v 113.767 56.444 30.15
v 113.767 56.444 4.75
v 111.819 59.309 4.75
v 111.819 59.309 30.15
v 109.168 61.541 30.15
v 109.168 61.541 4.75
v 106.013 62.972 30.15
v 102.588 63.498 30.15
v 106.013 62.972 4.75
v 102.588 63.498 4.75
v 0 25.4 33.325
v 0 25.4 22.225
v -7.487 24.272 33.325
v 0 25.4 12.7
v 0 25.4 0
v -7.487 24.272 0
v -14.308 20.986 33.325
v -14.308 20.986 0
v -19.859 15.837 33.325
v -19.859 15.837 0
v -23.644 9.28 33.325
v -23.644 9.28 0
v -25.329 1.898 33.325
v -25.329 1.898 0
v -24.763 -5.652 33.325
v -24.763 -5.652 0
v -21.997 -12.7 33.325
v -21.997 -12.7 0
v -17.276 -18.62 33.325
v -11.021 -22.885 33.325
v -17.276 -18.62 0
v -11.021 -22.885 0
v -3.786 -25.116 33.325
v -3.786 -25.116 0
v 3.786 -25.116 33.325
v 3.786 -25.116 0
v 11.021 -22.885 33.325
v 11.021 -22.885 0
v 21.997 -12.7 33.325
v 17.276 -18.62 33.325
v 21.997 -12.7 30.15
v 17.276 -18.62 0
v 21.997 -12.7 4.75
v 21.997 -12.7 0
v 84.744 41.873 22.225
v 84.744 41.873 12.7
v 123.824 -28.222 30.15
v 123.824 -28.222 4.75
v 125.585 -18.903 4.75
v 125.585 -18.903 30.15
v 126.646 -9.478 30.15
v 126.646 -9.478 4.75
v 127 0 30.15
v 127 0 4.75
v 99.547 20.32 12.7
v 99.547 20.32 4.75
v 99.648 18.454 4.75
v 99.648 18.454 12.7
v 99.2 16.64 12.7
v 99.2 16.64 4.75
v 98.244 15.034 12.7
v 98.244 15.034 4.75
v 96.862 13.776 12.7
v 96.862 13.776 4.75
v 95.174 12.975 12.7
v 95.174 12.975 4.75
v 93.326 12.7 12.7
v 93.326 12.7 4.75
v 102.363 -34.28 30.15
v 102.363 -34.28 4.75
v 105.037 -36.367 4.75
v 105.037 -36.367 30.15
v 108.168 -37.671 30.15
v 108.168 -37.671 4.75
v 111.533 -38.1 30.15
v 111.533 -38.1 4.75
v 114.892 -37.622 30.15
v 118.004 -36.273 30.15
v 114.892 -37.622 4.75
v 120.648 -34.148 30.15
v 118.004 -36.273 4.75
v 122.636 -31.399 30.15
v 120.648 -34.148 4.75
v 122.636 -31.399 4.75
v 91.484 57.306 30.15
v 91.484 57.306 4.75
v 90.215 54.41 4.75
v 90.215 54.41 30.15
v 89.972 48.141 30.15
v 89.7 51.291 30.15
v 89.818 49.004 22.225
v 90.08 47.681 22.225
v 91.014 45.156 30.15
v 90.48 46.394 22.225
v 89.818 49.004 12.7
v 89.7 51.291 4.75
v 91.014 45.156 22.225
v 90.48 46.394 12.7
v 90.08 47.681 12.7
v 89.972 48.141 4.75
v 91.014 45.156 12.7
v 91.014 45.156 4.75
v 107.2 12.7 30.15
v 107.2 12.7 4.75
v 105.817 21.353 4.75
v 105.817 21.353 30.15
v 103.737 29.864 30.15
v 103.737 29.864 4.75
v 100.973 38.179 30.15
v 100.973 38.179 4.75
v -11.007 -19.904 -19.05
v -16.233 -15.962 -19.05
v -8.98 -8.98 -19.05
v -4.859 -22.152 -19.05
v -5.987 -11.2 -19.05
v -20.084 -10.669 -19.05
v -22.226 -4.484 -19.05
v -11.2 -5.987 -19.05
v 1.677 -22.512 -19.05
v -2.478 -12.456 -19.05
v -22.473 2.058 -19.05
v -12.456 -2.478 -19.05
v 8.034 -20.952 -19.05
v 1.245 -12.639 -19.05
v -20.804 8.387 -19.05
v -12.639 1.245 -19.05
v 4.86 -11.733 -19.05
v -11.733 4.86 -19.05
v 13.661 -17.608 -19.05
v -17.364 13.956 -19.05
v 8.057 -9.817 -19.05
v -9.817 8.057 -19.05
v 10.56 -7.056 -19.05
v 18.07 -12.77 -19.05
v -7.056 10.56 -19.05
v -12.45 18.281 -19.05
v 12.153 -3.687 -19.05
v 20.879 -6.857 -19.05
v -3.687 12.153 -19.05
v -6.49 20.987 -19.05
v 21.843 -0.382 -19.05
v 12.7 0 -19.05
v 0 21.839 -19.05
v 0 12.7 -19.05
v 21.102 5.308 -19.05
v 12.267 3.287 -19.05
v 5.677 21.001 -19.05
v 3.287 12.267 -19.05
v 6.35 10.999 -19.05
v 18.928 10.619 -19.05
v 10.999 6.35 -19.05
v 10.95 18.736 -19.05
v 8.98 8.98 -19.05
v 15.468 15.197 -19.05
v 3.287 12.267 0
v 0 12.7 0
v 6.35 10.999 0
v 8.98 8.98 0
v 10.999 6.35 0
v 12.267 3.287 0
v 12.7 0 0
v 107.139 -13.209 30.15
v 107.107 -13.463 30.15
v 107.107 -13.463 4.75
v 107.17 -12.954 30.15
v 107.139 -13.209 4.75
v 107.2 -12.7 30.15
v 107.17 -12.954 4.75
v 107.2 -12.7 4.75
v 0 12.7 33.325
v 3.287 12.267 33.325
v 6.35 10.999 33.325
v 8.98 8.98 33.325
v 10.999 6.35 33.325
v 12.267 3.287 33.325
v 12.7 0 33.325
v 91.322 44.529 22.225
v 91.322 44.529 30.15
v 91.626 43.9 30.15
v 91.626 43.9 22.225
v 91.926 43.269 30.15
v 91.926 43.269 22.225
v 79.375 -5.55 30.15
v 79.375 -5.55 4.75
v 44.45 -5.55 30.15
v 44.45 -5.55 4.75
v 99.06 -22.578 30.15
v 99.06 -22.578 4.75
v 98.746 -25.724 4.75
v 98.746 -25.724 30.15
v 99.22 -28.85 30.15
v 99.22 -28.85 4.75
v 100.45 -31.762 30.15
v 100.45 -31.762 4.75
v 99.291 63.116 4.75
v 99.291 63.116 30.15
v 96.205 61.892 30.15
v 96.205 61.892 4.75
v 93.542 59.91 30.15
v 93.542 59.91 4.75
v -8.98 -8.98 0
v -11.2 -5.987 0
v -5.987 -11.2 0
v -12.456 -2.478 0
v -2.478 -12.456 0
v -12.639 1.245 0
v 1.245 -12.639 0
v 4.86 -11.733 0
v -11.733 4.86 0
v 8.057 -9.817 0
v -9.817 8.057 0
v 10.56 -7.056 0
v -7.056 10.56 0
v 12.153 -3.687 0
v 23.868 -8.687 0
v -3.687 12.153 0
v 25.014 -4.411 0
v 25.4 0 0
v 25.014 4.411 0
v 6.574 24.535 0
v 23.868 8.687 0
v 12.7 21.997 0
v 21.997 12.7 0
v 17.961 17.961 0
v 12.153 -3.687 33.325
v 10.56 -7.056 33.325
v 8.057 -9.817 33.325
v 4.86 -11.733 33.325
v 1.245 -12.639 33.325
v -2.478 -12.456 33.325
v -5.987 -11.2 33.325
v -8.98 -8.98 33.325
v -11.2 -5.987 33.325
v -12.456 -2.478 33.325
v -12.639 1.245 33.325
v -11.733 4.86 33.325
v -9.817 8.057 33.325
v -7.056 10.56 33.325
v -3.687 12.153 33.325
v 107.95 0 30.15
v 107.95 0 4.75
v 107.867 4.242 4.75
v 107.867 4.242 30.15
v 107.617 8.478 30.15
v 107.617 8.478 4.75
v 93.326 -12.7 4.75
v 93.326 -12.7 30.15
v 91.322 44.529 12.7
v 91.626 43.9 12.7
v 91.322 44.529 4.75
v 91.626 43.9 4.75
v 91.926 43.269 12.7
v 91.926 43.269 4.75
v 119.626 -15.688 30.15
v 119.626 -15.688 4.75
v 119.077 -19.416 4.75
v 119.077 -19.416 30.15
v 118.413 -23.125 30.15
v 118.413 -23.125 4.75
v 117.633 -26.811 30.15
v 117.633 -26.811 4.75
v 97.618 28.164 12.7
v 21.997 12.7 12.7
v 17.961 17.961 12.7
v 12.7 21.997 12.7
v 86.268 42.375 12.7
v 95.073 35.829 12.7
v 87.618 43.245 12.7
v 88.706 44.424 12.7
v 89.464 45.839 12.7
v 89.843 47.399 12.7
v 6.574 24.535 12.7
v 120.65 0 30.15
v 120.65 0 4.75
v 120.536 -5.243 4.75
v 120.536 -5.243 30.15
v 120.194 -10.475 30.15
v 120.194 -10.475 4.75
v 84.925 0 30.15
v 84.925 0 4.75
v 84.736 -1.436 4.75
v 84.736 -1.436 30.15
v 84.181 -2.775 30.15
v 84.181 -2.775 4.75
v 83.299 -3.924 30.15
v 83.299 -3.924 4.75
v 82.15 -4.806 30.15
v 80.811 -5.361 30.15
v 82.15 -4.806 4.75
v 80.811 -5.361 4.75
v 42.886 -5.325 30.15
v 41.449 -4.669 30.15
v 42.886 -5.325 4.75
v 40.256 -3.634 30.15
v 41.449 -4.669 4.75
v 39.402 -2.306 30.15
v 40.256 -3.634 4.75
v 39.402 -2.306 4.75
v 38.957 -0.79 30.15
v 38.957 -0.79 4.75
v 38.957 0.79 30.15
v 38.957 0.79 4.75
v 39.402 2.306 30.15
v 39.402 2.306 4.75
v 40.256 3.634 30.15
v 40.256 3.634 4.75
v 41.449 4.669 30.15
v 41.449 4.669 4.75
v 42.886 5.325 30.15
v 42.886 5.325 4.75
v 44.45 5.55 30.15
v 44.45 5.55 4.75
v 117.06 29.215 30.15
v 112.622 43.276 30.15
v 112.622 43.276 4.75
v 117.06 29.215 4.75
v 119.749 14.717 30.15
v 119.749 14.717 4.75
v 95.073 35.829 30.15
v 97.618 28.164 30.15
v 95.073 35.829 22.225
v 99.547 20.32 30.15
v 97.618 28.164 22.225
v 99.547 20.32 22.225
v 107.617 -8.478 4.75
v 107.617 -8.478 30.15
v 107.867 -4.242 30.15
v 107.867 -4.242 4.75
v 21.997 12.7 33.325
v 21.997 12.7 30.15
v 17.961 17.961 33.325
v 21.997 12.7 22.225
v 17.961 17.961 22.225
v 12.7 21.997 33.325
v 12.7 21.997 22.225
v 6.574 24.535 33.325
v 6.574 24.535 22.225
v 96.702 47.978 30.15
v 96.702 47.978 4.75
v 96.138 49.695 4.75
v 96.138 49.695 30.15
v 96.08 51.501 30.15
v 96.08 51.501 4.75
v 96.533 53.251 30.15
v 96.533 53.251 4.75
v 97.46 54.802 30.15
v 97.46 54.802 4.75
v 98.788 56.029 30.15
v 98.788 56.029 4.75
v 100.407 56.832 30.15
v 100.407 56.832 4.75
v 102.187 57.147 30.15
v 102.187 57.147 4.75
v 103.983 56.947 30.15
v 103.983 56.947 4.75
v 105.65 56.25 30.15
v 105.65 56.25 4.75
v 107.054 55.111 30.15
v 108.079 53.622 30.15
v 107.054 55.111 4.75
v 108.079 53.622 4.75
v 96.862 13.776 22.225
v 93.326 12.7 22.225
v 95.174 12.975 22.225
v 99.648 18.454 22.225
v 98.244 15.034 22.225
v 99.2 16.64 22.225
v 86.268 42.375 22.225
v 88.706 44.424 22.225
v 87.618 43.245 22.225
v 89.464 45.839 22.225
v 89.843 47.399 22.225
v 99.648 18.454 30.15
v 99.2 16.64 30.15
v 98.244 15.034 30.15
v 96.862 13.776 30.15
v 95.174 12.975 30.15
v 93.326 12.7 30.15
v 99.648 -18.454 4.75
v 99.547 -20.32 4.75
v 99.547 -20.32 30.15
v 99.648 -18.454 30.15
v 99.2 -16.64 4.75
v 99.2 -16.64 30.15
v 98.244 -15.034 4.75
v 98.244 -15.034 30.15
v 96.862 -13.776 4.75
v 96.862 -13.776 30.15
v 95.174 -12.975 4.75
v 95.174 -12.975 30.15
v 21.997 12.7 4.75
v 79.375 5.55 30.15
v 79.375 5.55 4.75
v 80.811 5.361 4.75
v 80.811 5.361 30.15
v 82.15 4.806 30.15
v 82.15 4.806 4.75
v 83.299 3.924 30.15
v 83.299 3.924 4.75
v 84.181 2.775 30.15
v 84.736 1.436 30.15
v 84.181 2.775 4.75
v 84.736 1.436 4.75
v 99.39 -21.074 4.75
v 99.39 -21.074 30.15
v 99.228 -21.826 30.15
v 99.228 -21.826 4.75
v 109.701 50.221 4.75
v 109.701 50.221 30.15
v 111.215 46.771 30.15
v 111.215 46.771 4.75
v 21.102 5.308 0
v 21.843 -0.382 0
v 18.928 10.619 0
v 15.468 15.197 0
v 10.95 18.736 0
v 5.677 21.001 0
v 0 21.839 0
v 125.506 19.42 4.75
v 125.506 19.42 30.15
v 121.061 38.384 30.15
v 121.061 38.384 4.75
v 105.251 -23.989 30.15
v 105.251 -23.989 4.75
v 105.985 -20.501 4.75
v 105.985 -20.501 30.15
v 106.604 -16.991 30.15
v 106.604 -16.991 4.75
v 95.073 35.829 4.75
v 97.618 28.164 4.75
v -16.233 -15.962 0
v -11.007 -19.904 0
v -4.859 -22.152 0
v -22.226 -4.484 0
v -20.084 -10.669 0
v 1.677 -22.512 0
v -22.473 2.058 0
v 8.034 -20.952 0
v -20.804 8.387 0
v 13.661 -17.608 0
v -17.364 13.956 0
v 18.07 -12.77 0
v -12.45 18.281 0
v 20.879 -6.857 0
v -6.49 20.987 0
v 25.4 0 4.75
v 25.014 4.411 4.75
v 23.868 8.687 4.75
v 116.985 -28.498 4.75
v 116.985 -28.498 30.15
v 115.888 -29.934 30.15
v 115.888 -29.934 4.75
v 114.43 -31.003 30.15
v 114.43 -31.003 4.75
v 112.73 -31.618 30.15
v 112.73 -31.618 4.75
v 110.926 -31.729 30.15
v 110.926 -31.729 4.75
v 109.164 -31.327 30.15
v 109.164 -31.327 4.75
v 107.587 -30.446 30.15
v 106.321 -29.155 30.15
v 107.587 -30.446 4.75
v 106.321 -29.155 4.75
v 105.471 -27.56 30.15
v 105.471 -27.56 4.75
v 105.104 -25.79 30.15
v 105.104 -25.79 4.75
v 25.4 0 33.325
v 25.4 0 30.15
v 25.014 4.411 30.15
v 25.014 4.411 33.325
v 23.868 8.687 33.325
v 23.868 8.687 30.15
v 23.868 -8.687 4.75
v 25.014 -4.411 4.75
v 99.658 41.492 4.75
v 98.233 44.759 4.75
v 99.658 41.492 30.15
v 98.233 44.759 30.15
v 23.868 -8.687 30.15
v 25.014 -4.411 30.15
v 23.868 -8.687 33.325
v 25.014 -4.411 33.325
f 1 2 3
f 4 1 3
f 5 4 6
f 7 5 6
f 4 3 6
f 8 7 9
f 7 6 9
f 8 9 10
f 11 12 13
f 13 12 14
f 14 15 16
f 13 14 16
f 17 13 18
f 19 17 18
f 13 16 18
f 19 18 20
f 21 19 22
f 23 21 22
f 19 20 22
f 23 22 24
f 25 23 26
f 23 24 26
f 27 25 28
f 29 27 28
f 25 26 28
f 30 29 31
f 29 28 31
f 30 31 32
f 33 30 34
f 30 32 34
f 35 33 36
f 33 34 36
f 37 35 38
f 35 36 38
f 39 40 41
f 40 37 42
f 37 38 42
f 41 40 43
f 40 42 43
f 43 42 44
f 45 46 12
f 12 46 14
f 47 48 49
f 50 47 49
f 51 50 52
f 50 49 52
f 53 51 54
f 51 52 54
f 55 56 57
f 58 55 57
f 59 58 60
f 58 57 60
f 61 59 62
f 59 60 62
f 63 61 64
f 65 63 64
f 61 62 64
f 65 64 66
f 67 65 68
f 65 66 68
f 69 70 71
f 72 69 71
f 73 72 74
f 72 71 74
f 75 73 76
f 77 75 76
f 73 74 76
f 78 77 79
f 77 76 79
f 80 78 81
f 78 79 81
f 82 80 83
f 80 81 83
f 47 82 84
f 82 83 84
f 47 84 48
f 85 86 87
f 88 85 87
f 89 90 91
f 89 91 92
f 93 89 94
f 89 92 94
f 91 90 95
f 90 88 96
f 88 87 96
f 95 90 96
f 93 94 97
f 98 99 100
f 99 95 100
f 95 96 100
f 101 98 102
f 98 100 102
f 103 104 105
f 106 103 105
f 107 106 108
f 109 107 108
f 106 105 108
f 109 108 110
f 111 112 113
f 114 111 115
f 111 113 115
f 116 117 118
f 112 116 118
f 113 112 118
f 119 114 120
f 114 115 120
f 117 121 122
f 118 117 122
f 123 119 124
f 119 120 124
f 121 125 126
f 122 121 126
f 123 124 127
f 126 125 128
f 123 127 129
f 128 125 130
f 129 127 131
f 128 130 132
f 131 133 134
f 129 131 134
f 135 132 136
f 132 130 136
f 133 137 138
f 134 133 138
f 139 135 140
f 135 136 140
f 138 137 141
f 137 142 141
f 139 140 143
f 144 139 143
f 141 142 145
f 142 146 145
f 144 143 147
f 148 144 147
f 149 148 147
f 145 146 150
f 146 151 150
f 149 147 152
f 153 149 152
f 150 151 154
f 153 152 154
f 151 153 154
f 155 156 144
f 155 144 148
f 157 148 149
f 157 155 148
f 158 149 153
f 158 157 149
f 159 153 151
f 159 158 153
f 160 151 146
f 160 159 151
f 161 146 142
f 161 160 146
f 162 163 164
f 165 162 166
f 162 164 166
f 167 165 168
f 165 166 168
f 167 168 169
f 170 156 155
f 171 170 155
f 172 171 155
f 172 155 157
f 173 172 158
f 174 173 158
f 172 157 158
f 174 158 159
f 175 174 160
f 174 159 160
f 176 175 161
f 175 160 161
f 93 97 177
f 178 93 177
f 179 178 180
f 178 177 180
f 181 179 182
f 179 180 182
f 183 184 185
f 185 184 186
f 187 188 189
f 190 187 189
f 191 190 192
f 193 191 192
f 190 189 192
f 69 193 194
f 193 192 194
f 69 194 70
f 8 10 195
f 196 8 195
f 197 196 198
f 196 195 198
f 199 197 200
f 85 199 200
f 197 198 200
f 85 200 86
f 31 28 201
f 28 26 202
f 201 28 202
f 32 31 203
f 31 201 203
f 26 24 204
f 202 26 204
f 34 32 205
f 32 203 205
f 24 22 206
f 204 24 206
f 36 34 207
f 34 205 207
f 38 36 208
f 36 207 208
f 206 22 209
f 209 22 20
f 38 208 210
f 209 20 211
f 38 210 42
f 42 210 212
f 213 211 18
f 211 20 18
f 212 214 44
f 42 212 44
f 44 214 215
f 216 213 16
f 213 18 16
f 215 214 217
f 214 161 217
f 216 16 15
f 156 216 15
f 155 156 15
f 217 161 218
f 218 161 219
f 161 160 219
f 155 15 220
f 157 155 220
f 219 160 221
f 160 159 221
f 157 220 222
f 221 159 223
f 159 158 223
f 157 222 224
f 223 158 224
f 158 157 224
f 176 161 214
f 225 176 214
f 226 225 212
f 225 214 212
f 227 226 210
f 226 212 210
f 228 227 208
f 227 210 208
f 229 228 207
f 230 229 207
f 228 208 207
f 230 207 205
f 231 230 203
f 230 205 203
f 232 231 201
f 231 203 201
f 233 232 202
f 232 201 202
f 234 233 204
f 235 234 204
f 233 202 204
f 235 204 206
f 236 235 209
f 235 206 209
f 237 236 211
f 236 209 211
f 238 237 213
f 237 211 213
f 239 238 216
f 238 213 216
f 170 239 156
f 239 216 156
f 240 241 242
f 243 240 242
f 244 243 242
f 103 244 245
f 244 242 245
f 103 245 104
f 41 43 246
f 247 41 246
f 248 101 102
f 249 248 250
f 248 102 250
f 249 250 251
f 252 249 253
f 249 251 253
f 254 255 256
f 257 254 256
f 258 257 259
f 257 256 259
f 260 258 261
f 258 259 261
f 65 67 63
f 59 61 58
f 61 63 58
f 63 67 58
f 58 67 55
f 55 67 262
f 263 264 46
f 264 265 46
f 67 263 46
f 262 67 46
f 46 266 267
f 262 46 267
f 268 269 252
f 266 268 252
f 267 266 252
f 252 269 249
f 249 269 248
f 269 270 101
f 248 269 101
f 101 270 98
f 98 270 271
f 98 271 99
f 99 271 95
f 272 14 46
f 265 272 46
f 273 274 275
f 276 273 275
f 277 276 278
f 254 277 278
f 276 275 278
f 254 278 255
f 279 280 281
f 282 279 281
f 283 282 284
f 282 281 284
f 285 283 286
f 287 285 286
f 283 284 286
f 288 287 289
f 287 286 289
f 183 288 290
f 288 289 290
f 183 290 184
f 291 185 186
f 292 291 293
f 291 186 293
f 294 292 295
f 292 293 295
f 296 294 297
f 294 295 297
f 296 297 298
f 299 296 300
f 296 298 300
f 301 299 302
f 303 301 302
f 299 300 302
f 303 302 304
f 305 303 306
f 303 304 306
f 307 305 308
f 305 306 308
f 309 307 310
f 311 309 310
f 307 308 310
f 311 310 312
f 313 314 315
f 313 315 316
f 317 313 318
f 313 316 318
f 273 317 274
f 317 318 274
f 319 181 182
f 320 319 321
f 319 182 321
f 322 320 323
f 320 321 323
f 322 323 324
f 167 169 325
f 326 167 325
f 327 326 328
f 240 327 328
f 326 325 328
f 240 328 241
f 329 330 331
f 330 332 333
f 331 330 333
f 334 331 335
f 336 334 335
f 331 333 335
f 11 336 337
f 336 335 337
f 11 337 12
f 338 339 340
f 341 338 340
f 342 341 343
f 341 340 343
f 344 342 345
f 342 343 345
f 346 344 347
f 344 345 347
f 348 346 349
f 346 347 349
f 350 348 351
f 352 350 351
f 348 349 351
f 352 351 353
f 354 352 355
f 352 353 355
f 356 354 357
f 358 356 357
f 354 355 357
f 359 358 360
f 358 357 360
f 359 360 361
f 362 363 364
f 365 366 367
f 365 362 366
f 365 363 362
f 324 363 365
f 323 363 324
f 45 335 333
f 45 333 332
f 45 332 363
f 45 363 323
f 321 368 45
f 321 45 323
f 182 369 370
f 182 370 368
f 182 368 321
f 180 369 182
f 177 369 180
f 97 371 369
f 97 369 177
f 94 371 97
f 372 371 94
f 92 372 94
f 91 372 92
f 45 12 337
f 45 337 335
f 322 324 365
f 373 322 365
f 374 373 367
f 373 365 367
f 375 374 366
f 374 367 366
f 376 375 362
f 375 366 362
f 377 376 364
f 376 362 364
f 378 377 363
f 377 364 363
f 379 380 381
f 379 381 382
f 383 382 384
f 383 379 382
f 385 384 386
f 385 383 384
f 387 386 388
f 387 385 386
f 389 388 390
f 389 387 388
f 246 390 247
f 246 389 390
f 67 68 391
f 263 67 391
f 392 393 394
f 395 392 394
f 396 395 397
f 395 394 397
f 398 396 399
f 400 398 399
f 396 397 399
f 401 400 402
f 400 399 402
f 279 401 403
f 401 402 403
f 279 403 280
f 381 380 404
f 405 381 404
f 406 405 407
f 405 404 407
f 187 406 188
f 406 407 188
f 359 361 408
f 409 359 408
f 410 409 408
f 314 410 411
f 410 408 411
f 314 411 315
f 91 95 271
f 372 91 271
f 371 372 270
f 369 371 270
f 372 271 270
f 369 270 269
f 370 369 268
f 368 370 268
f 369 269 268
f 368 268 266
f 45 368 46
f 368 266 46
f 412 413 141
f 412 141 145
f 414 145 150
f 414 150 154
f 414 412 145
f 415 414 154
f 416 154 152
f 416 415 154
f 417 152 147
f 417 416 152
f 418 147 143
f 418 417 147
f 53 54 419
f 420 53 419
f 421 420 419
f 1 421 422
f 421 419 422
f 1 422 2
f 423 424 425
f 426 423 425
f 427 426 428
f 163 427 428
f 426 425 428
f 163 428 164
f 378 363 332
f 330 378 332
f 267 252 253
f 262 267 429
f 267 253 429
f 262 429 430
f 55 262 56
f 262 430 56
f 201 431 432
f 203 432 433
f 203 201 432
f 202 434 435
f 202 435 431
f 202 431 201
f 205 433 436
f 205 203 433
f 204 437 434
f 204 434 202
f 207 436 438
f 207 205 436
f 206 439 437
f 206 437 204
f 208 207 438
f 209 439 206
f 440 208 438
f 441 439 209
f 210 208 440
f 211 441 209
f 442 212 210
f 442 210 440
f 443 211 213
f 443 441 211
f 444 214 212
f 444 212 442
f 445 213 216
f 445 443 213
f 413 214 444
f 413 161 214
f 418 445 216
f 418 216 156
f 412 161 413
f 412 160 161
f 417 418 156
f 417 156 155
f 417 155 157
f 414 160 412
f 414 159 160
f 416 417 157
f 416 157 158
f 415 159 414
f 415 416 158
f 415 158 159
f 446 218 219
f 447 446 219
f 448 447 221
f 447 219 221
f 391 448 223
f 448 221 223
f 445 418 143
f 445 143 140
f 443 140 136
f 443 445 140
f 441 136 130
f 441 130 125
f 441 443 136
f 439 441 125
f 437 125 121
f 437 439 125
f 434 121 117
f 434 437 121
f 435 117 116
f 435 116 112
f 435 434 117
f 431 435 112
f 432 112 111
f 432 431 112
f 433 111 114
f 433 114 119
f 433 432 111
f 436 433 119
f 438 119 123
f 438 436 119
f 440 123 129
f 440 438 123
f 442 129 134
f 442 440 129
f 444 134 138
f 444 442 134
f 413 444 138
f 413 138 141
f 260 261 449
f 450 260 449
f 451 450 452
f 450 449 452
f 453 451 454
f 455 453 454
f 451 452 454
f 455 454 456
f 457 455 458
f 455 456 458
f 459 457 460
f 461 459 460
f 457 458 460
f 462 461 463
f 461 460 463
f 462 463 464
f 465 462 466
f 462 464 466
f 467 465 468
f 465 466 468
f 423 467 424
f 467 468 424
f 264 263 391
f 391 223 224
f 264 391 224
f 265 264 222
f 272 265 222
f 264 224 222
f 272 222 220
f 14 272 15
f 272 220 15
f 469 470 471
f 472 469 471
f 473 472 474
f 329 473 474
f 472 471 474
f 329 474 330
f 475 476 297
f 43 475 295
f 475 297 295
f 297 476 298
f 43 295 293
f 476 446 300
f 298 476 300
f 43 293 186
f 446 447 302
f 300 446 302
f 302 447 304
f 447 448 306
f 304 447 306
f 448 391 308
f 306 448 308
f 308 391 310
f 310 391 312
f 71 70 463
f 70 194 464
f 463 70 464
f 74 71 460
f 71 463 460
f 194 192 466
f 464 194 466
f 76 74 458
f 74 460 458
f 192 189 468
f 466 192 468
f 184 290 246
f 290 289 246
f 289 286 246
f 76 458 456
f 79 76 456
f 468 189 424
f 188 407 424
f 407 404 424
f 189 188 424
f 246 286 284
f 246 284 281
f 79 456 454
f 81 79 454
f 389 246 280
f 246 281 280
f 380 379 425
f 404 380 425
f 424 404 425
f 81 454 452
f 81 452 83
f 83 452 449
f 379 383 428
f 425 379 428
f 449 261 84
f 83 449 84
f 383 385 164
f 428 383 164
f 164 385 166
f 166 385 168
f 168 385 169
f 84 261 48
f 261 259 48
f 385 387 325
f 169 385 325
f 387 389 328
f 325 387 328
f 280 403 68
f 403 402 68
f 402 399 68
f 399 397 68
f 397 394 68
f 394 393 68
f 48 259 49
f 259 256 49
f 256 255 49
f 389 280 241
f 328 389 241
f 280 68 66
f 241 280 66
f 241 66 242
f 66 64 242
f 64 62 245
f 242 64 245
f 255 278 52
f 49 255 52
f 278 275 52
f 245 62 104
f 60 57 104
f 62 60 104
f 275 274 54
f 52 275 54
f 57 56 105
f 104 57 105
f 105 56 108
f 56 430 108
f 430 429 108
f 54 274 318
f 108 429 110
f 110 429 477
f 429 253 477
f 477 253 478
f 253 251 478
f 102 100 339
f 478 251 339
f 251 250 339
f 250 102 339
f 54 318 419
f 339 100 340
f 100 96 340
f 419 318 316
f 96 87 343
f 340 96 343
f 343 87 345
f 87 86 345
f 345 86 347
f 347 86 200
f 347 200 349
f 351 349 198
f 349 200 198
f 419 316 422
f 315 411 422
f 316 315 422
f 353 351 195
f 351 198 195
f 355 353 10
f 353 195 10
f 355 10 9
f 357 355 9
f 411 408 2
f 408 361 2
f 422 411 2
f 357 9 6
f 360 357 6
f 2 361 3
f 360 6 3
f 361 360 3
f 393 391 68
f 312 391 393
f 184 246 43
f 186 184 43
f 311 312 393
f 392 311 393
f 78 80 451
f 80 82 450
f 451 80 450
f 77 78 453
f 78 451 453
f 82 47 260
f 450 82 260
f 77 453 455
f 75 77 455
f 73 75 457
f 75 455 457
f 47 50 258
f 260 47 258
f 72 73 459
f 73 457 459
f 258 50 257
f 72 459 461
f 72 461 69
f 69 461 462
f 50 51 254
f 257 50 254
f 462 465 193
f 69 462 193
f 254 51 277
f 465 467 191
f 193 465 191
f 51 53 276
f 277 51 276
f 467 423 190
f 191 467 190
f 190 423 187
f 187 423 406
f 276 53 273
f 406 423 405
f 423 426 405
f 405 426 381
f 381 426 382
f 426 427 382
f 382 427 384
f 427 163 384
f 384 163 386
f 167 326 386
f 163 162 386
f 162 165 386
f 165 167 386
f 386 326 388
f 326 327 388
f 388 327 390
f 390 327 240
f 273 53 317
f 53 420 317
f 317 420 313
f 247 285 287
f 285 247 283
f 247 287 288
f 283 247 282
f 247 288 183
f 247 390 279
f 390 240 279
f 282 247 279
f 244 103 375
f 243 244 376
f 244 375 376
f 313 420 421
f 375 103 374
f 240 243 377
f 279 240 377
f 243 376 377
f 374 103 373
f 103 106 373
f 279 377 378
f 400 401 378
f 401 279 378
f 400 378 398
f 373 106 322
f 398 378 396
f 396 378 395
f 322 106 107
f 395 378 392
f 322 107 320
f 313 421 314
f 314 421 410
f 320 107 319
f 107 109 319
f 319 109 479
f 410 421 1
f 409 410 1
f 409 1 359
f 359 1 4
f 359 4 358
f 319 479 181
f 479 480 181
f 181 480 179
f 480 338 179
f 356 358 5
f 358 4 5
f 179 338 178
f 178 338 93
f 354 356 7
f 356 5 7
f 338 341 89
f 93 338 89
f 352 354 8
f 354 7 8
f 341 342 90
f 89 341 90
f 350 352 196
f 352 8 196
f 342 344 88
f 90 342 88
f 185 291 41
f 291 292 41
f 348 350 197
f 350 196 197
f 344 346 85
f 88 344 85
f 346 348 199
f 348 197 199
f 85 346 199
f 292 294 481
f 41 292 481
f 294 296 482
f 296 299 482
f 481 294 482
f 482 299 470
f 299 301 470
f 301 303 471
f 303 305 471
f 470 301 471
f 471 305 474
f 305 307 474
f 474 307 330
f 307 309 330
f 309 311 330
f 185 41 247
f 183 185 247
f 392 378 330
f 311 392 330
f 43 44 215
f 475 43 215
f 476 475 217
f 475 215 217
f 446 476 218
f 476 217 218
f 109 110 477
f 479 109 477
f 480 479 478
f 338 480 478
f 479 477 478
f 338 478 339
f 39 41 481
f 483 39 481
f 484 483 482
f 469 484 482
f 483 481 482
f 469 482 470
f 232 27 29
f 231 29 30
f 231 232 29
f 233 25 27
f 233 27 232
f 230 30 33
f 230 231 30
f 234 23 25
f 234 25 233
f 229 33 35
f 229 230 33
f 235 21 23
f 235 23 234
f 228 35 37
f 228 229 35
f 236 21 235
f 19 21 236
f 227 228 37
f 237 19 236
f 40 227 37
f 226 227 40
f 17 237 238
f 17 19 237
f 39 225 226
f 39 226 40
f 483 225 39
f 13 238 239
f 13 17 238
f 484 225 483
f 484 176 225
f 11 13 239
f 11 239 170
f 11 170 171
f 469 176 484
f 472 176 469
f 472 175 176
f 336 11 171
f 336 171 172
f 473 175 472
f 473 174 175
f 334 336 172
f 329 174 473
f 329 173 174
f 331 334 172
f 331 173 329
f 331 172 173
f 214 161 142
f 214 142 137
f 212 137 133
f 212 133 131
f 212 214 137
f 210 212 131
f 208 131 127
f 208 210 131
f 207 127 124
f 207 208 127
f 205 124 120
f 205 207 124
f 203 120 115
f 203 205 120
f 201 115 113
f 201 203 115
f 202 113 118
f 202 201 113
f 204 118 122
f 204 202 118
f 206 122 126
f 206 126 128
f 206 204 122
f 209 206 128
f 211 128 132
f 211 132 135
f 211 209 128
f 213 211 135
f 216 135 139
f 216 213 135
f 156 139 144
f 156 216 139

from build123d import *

# Parameters (mm, degrees)
F1_DEPTH     = 33.3248
F2_DEPTH     = 19.05
F3_DEPTH     = 30.1498
F5_DEPTH     = 4.7498
F6_DEPTH     = 22.225
F8_DEPTH     = 12.7
F9_T1_DEPTH  = 9.525
F9_T3_DEPTH  = 25.4
F9_T8_DEPTH  = 27.2571917505
F9_T13_DEPTH = 27.2317917505


# Not quite as in the source:
# - a fillet or chamfer that OpenCascade refuses, or shapes differently, is made with other operations: its cross-section is extruded or revolved along the edge and cut away or added


with BuildPart() as f1:
    # F0 (on Top) → F1 (new body)
    with BuildSketch(Plane.XY):
        with BuildLine():
            ThreePointArc((21.9970452561, 12.7), (12.7, 21.9970452561), (0, 25.4))
            ThreePointArc((0, 25.4), (-21.9970452561, -12.7), (21.9970452561, -12.7))
            ThreePointArc((21.9970452561, -12.7), (24.5345159877, -6.5740037456), (25.4, 0))
            ThreePointArc((25.4, 0), (24.5345159877, 6.5740037456), (21.9970452561, 12.7))
        make_face()
        with BuildLine():
            ThreePointArc((21.8425407432, -0.3824569867), (-16.232550455, -15.9620986388), (0, 21.8392519916))
            ThreePointArc((0, 21.8392519916), (15.4676319414, 15.1971846654), (21.8425407432, -0.3824569867))
        make_face(mode=Mode.SUBTRACT)
        with BuildLine():
            ThreePointArc((21.8425407432, -0.3824569867), (15.4676319414, 15.1971846654), (0, 21.8392519916))
            ThreePointArc((0, 21.8392519916), (-16.232550455, -15.9620986388), (21.8425407432, -0.3824569867))
        make_face()
        with BuildLine():
            ThreePointArc((0, 12.7), (8.9802561211, 8.9802561211), (12.7, 0))
            ThreePointArc((12.7, 0), (-8.9802561211, -8.9802561211), (0, 12.7))
        make_face(mode=Mode.SUBTRACT)
    extrude(amount=F1_DEPTH)

    # F0 (on Top) → F3 (join)
    with BuildSketch(Plane.XY):
        with BuildLine():
            Line((25.4, 12.7), (21.9970452561, 12.7))
            ThreePointArc((21.9970452561, 12.7), (24.5345159877, 6.5740037456), (25.4, 0))
            ThreePointArc((25.4, 0), (24.5345159877, -6.5740037456), (21.9970452561, -12.7))
            Line((21.9970452561, -12.7), (25.4, -12.7))
            Line((25.4, -12.7), (100.8031249516, -12.7))
            ThreePointArc((100.8031249516, -12.7), (101.4005855384, -6.3624879144), (101.6, 0))
            ThreePointArc((101.6, 0), (101.4005855384, 6.3624879144), (100.8031249516, 12.7))
            Line((100.8031249516, 12.7), (25.4, 12.7))
        make_face()
        with BuildLine():
            ThreePointArc((44.45, -5.5499), (38.9001, 0), (44.45, 5.5499))
            Line((44.45, 5.5499), (79.375, 5.5499))
            ThreePointArc((79.375, 5.5499), (83.2993719249, 3.9243719249), (84.9249, 0))
            ThreePointArc((84.9249, 0), (83.2993719249, -3.9243719249), (79.375, -5.5499))
            Line((79.375, -5.5499), (44.45, -5.5499))
        make_face(mode=Mode.SUBTRACT)
        with BuildLine():
            Line((107.2003381525, 12.7), (100.8031249516, 12.7))
            ThreePointArc((100.8031249516, 12.7), (101.4005855384, 6.3624879144), (101.6, 0))
            ThreePointArc((101.6, 0), (101.4005855384, -6.3624879144), (100.8031249516, -12.7))
            Line((100.8031249516, -12.7), (107.2003381525, -12.7))
            ThreePointArc((107.2003381525, -12.7), (107.762421566, -6.3610532321), (107.95, 0))
            ThreePointArc((107.95, 0), (107.762421566, 6.3610532321), (107.2003381525, 12.7))
        make_face()
        with BuildLine():
            ThreePointArc((91.0139318516, 45.1555556815), (91.4748276183, 44.2144310402), (91.9259920573, 43.2686027539))
            ThreePointArc((91.9259920573, 43.2686027539), (97.5691447351, 28.3341136382), (100.8031249516, 12.7))
            Line((100.8031249516, 12.7), (107.2003381525, 12.7))
            ThreePointArc((107.2003381525, 12.7), (104.8633855035, 25.6295314189), (100.9729543694, 38.1793790668))
            ThreePointArc((100.9729543694, 38.1793790668), (95.1042946416, 40.3981403326), (91.0139318516, 45.1555556815))
        make_face()
        with BuildLine():
            ThreePointArc((91.4835891574, 57.3058061184), (89.7001505826, 51.2905410623), (91.0139318516, 45.1555556815))
            ThreePointArc((91.0139318516, 45.1555556815), (95.1042946416, 40.3981403326), (100.9729543694, 38.1793790668))
            ThreePointArc((100.9729543694, 38.1793790668), (98.95897619, 43.1314679952), (96.7023027034, 47.9777776879))
            ThreePointArc((96.7023027034, 47.9777776879), (94.2084683161, 52.7064227352), (91.4835891574, 57.3058061184))
        make_face()
        with BuildLine():
            ThreePointArc((102.5883418008, 63.4984616078), (96.2051950503, 61.8918825067), (91.4835891574, 57.3058061184))
            ThreePointArc((91.4835891574, 57.3058061184), (94.2084683161, 52.7064227352), (96.7023027034, 47.9777776879))
            ThreePointArc((96.7023027034, 47.9777776879), (99.5684512872, 56.4883707973), (108.0790442979, 53.6222219202))
            ThreePointArc((108.0790442979, 53.6222219202), (105.4493808375, 58.6246584723), (102.5883418008, 63.4984616078))
        make_face()
        with BuildLine():
            ThreePointArc((113.7674145133, 56.4444452091), (109.1679535141, 61.5405062404), (102.5883418008, 63.4984616078))
            ThreePointArc((102.5883418008, 63.4984616078), (105.4493808375, 58.6246584723), (108.0790442979, 53.6222219202))
            ThreePointArc((108.0790442979, 53.6222219202), (110.4715620752, 48.5021285374), (112.6216847045, 43.2756124663))
            ThreePointArc((112.6216847044, 43.2756124663), (114.4576498997, 46.8404446919), (115.0906734034, 50.8))
            ThreePointArc((115.0906734034, 50.8), (114.7554340581, 53.6987400629), (113.7674145133, 56.4444452091))
        make_face()
        with BuildLine():
            ThreePointArc((115.0906734034, 50.8), (114.4576498997, 46.8404446919), (112.6216847044, 43.2756124663))
            ThreePointArc((112.6216847045, 43.2756124663), (118.6259431145, 22.0070016178), (120.65, 0))
            ThreePointArc((120.65, 0), (120.3936458808, -7.8608225729), (119.625672913, -15.6882401853))
            ThreePointArc((119.625672913, -15.6882401853), (122.957733543, -20.0447240945), (124.1420477199, -25.4))
            ThreePointArc((124.1420477199, -25.4), (124.0624104306, -26.8200158629), (123.8244973181, -28.2222228733))
            ThreePointArc((123.8244973181, -28.2222228733), (126.2036274427, -14.2001556434), (127, 0))
            ThreePointArc((127, 0), (123.6476074236, 28.9873968891), (113.7674145133, 56.4444452091))
            ThreePointArc((113.7674145133, 56.4444452091), (114.7554340581, 53.6987400629), (115.0906734034, 50.8))
        make_face()
        with BuildLine():
            ThreePointArc((124.1420477199, -25.4), (122.957733543, -20.0447240945), (119.625672913, -15.6882401853))
            ThreePointArc((119.625672913, -15.6882401853), (118.759763313, -21.2730138401), (117.6332727213, -26.8111105491))
            ThreePointArc((117.6332727213, -26.8111105491), (116.2486727134, -32.2903792542), (114.6090014612, -37.6987968517))
            ThreePointArc((114.6090014612, -37.6987968517), (120.546845886, -34.2539624098), (123.8244973181, -28.2222228733))
            ThreePointArc((123.8244973181, -28.2222228733), (124.0624104306, -26.8200158629), (124.1420477199, -25.4))
        make_face()
        with BuildLine():
            ThreePointArc((105.2508227996, -23.988889095), (103.9341328656, -29.1701649887), (102.3625461374, -34.2799015205))
            ThreePointArc((102.3625461374, -34.2799015205), (108.0271148048, -37.6322619815), (114.6090014612, -37.6987968517))
            ThreePointArc((114.6090014612, -37.6987968517), (116.2486727134, -32.2903792542), (117.6332727213, -26.8111105491))
            ThreePointArc((117.6332727213, -26.8111105491), (110.0309369928, -31.5912249609), (105.2508227996, -23.988889095))
        make_face()
        with BuildLine():
            ThreePointArc((107.1072287434, -13.462691072), (101.9216499986, -16.9945239737), (99.0595978685, -22.5777782371))
            ThreePointArc((99.0595978685, -22.5777782371), (99.2195781588, -28.8498170717), (102.3625461374, -34.2799015205))
            ThreePointArc((102.3625461374, -34.2799015205), (103.9341328656, -29.1701649887), (105.2508227996, -23.988889095))
            ThreePointArc((105.2508227996, -23.988889095), (106.309386815, -18.7487806272), (107.1072287434, -13.462691072))
        make_face()
        with BuildLine():
            Line((107.2003381525, -12.7), (100.8031249516, -12.7))
            ThreePointArc((100.8031249516, -12.7), (100.0533338724, -17.6604184834), (99.0595978685, -22.5777782371))
            ThreePointArc((99.0595978685, -22.5777782371), (101.9216499986, -16.9945239737), (107.1072287434, -13.462691072))
            ThreePointArc((107.1072287434, -13.462691072), (107.1544620239, -13.0814283766), (107.2003381525, -12.7))
        make_face()
    extrude(amount=F3_DEPTH)

    # F4 (on face) → F5 (cut)
    with BuildSketch(Plane(origin=(0, 0, 0), x_dir=(1, 0, 0), z_dir=(0, 0, -1))):
        with BuildLine():
            ThreePointArc((21.9970452561, 12.7), (24.5345159877, 6.5740037456), (25.4, 0))
            ThreePointArc((25.4, 0), (24.5345159877, -6.5740037456), (21.9970452561, -12.7))
            Line((21.9970452561, -12.7), (100.8031249516, -12.7))
            ThreePointArc((100.8031249516, -12.7), (97.2717152815, -29.3389401), (91.0139318516, -45.1555556815))
            ThreePointArc((91.0139318516, -45.1555556815), (96.7462286396, -62.1767413308), (113.7674145133, -56.4444452091))
            ThreePointArc((113.7674145133, -56.4444452091), (126.1134025906, -14.9803099778), (123.8244973181, 28.2222228733))
            ThreePointArc((123.8244973181, 28.2222228733), (108.6198254018, 37.7824497248), (99.0595978685, 22.5777782371))
            ThreePointArc((99.0595978685, 22.5777782371), (100.0533338724, 17.6604184834), (100.8031249516, 12.7))
            Line((100.8031249516, 12.7), (21.9970452561, 12.7))
        make_face()
        with BuildLine():
            Line((44.45, 5.5499), (79.375, 5.5499))
            ThreePointArc((79.375, 5.5499), (84.9249, 0), (79.375, -5.5499))
            Line((79.375, -5.5499), (44.45, -5.5499))
            ThreePointArc((44.45, -5.5499), (38.9001, 0), (44.45, 5.5499))
        make_face(mode=Mode.SUBTRACT)
        with BuildLine():
            ThreePointArc((117.6332727213, 26.8111105491), (119.8077324573, -14.23129451), (108.0790442979, -53.6222219202))
            ThreePointArc((108.0790442979, -53.6222219202), (99.5684512872, -56.4883707973), (96.7023027034, -47.9777776879))
            ThreePointArc((96.7023027034, -47.9777776879), (107.1963922297, -12.7332632479), (105.2508227996, 23.988889095))
            ThreePointArc((105.2508227996, 23.988889095), (110.0309369928, 31.5912249609), (117.6332727213, 26.8111105491))
        make_face(mode=Mode.SUBTRACT)
    extrude(amount=-F5_DEPTH, mode=Mode.SUBTRACT)

    # F0 (on Top) → F6 (join)
    with BuildSketch(Plane.XY):
        with BuildLine():
            Line((91.9259920573, 43.2686027539), (0, 25.4))
            ThreePointArc((0, 25.4), (12.7, 21.9970452561), (21.9970452561, 12.7))
            Line((21.9970452561, 12.7), (25.4, 12.7))
            Line((25.4, 12.7), (100.8031249516, 12.7))
            ThreePointArc((100.8031249516, 12.7), (97.5691447351, 28.3341136382), (91.9259920573, 43.2686027539))
        make_face()
    extrude(amount=F6_DEPTH)

    # F7 (on face) → F8 (cut)
    with BuildSketch(Plane(origin=(0, 0, 0), x_dir=(1, 0, 0), z_dir=(0, 0, -1))):
        with BuildLine():
            Line((100.8031249516, -12.7), (21.9970452561, -12.7))
            ThreePointArc((21.9970452561, -12.7), (12.7, -21.9970452561), (0, -25.4))
            Line((0, -25.4), (91.9259920573, -43.2686027539))
            ThreePointArc((91.9259920573, -43.2686027539), (97.5691447351, -28.3341136382), (100.8031249516, -12.7))
        make_face()
    extrude(amount=-F8_DEPTH, mode=Mode.SUBTRACT)

    # F9: fillet of radius 6.35 on 4 edges, made by hand

    # F9_s2 → F9_t1 (join)
    with BuildSketch(Plane.XY.offset(12.7)):
        with BuildLine():
            ThreePointArc((89.8183213038, 49.0039034869), (88.7059686824, 44.4242725365), (84.7437823747, 41.8725226155))
            Line((84.7437823747, 41.8725226155), (84.8649460867, 41.249189354))
            Line((84.8649460867, 41.249189354), (92.0471557694, 42.6452694924))
            Line((92.0471557694, 42.6452694924), (92.5005295077, 43.5390315211))
            ThreePointArc((92.5005295077, 43.5390315211), (91.5827689292, 45.4377778974), (90.4469389088, 49.0937083126))
            Line((90.4469389088, 49.0937083126), (89.8183213038, 49.0039034869))
        make_face()
    extrude(amount=F9_T1_DEPTH)

    # F9_s4 → F9_t3 (join)
    with BuildSketch(Plane.XY.offset(4.7498)):
        with BuildLine():
            ThreePointArc((99.5472631467, -20.32), (98.2442480497, -15.0339073716), (93.3255592, -12.7))
            Line((93.3255592, -12.7), (100.8031249516, -12.7))
            ThreePointArc((100.8031249516, -12.7), (100.247621432, -16.5219368483), (99.5472631467, -20.32))
        make_face()
    extrude(amount=F9_T3_DEPTH)


with BuildPart() as f2:
    # F0 (on Top) → F2 (new body)
    with BuildSketch(Plane.XY):
        with BuildLine():
            ThreePointArc((21.8425407432, -0.3824569867), (15.4676319414, 15.1971846654), (0, 21.8392519916))
            ThreePointArc((0, 21.8392519916), (-16.232550455, -15.9620986388), (21.8425407432, -0.3824569867))
        make_face()
        with BuildLine():
            ThreePointArc((0, 12.7), (8.9802561211, 8.9802561211), (12.7, 0))
            ThreePointArc((12.7, 0), (-8.9802561211, -8.9802561211), (0, 12.7))
        make_face(mode=Mode.SUBTRACT)
    extrude(amount=-F2_DEPTH)


with BuildPart() as f9_tool6:
    # F9_s7 → F9_t8 (new body)
    with BuildSketch(Plane.XY.offset(4.7498)):
        with BuildLine():
            ThreePointArc((99.5472631467, 20.32), (98.2442480497, 15.0339073716), (93.3255592, 12.7))
            Line((93.3255592, 12.7), (100.8031249516, 12.7))
            ThreePointArc((100.8031249516, 12.7), (100.247621432, 16.5219368483), (99.5472631467, 20.32))
        make_face()
    extrude(amount=F9_T8_DEPTH)

    split(bisect_by=Plane.XY.offset(30.1498), keep=Keep.BOTTOM)


with BuildPart() as f1_1:
    add(f1.part)

    # F9_t5: union F9_tool6
    add(f9_tool6.part)


with BuildPart() as f9_tool11:
    # F9_s12 → F9_t13 (new body)
    with BuildSketch(Plane.XY.offset(2.9180082495)):
        with BuildLine():
            ThreePointArc((99.5472631467, 20.32), (98.2442480497, 15.0339073716), (93.3255592, 12.7))
            Line((93.3255592, 12.7), (100.8031249516, 12.7))
            ThreePointArc((100.8031249516, 12.7), (100.247621432, 16.5219368483), (99.5472631467, 20.32))
        make_face()
    extrude(amount=F9_T13_DEPTH)

    split(bisect_by=Plane.XY.offset(4.7498), keep=Keep.TOP)


with BuildPart() as f1_2:
    add(f1_1.part)

    # F9_t10: union F9_tool11
    add(f9_tool11.part)


solid = Compound([f2.part, f1_2.part])
